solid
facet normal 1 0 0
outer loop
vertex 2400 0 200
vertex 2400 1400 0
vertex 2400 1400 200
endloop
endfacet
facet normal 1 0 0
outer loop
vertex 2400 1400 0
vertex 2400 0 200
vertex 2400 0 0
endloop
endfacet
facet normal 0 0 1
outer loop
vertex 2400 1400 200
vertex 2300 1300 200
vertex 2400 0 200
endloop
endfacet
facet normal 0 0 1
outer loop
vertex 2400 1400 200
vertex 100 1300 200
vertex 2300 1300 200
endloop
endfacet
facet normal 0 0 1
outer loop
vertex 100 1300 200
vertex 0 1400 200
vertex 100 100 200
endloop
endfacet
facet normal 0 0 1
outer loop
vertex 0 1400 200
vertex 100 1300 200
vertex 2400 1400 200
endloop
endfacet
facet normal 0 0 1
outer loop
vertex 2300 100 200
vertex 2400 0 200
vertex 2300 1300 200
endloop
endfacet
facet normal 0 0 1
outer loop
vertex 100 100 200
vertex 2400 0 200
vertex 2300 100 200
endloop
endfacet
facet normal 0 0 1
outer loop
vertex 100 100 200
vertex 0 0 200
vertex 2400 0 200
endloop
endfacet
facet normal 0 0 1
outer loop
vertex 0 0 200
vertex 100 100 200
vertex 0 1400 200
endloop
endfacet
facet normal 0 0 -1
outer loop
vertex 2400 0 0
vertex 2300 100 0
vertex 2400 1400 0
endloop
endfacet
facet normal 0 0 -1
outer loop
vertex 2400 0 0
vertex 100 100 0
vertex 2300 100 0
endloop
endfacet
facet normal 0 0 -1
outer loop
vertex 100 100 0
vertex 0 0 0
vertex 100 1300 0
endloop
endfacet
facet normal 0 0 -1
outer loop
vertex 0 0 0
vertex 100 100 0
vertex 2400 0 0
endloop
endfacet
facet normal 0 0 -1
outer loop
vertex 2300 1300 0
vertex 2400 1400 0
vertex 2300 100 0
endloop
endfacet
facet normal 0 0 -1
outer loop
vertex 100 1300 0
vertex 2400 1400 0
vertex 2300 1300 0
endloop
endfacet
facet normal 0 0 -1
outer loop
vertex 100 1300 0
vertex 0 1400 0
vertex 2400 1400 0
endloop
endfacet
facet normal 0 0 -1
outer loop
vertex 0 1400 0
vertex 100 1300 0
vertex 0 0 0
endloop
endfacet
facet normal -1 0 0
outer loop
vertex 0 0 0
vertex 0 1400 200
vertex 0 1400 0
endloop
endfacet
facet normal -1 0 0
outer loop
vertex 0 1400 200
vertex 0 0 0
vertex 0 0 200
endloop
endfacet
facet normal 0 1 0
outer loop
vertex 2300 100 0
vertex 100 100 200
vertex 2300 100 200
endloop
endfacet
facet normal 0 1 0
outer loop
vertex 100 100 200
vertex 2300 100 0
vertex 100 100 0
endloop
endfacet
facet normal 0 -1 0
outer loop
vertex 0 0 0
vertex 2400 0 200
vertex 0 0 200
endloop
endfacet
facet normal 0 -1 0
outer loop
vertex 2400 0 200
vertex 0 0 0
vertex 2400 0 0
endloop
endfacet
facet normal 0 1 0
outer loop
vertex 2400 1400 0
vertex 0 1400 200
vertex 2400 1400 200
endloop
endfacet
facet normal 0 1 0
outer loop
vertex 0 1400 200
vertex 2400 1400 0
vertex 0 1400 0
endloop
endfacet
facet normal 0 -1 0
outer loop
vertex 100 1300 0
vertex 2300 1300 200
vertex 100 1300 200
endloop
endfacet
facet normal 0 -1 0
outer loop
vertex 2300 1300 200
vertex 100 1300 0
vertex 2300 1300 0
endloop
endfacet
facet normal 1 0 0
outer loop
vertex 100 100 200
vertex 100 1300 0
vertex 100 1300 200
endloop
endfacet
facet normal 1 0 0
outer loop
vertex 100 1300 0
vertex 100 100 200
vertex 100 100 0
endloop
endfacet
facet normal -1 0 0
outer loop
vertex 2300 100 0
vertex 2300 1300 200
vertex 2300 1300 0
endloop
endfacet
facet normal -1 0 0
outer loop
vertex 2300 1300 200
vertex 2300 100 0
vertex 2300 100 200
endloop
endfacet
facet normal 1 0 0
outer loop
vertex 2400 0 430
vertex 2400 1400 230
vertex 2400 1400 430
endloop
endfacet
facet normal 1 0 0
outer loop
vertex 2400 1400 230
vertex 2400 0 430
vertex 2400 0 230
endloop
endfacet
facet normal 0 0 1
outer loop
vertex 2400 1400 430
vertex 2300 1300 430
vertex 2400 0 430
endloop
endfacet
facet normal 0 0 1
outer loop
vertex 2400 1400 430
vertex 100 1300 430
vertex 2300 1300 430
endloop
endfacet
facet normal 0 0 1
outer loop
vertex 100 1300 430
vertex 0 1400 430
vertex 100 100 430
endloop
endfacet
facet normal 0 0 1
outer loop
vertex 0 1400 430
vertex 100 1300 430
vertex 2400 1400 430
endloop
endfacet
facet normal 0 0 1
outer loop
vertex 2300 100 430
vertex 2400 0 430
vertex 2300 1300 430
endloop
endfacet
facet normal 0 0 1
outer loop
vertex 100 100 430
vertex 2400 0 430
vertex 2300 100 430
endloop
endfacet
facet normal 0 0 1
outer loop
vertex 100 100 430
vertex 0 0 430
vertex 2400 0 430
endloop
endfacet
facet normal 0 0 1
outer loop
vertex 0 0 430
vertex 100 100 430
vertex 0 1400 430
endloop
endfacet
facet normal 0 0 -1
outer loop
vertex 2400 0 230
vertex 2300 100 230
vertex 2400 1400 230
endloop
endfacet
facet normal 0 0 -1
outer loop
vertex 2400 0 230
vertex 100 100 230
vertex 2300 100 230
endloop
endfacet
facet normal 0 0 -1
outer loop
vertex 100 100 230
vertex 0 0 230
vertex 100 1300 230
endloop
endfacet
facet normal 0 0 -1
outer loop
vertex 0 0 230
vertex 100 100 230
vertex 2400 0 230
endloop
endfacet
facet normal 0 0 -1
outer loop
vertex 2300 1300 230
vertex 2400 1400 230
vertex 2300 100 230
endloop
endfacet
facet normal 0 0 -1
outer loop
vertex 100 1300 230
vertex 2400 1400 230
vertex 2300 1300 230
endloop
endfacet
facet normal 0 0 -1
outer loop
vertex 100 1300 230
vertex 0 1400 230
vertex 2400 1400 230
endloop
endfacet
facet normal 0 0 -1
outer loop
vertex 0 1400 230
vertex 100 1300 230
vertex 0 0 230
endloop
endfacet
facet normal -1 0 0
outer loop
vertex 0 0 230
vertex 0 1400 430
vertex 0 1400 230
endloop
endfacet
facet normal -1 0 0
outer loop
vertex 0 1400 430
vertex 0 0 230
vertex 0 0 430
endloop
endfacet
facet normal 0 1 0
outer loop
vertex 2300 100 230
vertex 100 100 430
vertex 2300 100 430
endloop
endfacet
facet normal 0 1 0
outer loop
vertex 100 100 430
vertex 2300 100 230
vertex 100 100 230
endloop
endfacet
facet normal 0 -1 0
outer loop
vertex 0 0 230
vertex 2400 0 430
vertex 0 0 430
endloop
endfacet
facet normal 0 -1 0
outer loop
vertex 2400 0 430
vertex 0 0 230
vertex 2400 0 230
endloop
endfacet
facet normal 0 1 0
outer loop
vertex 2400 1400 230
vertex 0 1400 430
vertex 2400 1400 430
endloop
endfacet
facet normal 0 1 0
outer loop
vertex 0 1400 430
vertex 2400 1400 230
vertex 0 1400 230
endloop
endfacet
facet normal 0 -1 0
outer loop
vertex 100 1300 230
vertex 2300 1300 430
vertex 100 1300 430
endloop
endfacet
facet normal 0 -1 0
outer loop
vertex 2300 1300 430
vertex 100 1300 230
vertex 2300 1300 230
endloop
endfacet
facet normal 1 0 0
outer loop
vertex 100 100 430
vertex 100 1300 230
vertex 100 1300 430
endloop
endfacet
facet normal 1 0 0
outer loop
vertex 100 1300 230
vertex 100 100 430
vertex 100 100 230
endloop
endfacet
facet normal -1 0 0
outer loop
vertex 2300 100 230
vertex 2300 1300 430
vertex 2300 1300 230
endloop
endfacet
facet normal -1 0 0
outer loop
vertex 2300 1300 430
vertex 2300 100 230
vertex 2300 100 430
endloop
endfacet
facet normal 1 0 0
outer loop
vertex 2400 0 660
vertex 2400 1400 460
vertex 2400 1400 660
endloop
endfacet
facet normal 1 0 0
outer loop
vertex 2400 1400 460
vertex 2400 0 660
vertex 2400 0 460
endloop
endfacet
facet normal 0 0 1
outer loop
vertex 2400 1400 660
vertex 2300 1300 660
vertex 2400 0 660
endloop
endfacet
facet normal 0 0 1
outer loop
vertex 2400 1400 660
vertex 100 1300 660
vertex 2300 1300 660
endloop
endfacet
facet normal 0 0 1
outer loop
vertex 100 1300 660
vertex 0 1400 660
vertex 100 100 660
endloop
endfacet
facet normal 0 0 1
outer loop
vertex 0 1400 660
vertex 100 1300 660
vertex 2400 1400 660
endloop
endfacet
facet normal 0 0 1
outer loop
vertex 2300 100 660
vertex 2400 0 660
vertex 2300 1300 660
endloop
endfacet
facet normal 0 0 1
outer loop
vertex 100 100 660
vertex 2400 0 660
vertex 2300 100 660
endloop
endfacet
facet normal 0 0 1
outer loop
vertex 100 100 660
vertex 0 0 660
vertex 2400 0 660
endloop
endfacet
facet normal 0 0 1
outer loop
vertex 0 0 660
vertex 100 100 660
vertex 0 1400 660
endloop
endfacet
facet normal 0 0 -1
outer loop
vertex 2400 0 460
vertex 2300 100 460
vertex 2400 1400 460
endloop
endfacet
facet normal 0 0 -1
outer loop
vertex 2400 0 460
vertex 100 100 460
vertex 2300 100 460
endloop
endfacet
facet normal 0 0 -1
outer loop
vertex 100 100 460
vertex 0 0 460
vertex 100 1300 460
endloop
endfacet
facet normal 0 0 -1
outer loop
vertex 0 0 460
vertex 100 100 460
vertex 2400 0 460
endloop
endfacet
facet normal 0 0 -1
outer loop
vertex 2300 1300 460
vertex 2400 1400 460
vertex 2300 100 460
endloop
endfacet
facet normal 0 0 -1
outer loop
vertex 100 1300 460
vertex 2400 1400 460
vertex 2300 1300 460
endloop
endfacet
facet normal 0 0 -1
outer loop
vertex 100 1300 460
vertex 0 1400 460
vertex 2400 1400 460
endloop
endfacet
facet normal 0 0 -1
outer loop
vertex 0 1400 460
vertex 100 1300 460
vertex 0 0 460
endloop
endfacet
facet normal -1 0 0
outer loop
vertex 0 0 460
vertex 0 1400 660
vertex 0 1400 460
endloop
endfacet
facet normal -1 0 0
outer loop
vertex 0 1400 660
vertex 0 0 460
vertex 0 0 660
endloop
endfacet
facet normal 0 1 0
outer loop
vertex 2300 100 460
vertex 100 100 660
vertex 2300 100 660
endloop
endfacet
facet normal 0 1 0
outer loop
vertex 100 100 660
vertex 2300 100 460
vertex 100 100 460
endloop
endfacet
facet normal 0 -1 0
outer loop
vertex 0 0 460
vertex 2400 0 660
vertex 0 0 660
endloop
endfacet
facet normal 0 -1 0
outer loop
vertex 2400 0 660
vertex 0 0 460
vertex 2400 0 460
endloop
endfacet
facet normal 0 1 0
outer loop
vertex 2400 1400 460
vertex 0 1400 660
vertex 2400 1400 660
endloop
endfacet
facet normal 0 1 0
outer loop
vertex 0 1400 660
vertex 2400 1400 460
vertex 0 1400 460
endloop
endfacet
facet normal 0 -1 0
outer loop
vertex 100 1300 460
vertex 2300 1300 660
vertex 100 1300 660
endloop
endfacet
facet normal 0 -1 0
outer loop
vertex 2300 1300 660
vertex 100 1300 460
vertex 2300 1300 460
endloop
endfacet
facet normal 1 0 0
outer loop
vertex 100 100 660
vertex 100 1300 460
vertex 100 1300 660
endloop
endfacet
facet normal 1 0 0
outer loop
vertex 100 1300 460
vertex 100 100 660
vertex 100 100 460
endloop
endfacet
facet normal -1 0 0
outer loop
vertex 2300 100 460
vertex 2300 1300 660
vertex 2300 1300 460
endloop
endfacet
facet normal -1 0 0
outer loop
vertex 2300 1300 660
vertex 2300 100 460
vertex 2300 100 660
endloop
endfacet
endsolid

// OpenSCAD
// Generated from plan.json; millimetres. Not a structural design.
// Open in OpenSCAD. Increase explode_mm to inspect courses.
explode_mm = 30;
$fn = 24;
show_fixing_paths = false;

// first-bed-01-C1-S
translate([0, 0, 0+0*explode_mm])
  color([0.70,0.52,0.33]) cube([2400, 100, 200]);
// first-bed-01-C1-N
translate([0, 1300, 0+0*explode_mm])
  color([0.70,0.52,0.33]) cube([2400, 100, 200]);
// first-bed-01-C1-W
translate([0, 100, 0+0*explode_mm])
  color([0.70,0.52,0.33]) cube([100, 1200, 200]);
// first-bed-01-C1-E
translate([2300, 100, 0+0*explode_mm])
  color([0.70,0.52,0.33]) cube([100, 1200, 200]);
// first-bed-01-C2-S
translate([0, 0, 200+1*explode_mm])
  color([0.70,0.52,0.33]) cube([2400, 100, 200]);
// first-bed-01-C2-N
translate([0, 1300, 200+1*explode_mm])
  color([0.70,0.52,0.33]) cube([2400, 100, 200]);
// first-bed-01-C2-W
translate([0, 100, 200+1*explode_mm])
  color([0.70,0.52,0.33]) cube([100, 1200, 200]);
// first-bed-01-C2-E
translate([2300, 100, 200+1*explode_mm])
  color([0.70,0.52,0.33]) cube([100, 1200, 200]);
// first-bed-01-C3-S
translate([0, 0, 400+2*explode_mm])
  color([0.70,0.52,0.33]) cube([2400, 100, 200]);
// first-bed-01-C3-N
translate([0, 1300, 400+2*explode_mm])
  color([0.70,0.52,0.33]) cube([2400, 100, 200]);
// first-bed-01-C3-W
translate([0, 100, 400+2*explode_mm])
  color([0.70,0.52,0.33]) cube([100, 1200, 200]);
// first-bed-01-C3-E
translate([2300, 100, 400+2*explode_mm])
  color([0.70,0.52,0.33]) cube([100, 1200, 200]);
if (show_fixing_paths) translate([50.0, 1400, 50.0+0*explode_mm]) rotate([90,0,0]) color([0.8,0.1,0.1]) cylinder(d=7, h=150);
if (show_fixing_paths) translate([50.0, 1400, 150.0+0*explode_mm]) rotate([90,0,0]) color([0.8,0.1,0.1]) cylinder(d=7, h=150);
if (show_fixing_paths) translate([2350.0, 1400, 50.0+0*explode_mm]) rotate([90,0,0]) color([0.8,0.1,0.1]) cylinder(d=7, h=150);
if (show_fixing_paths) translate([2350.0, 1400, 150.0+0*explode_mm]) rotate([90,0,0]) color([0.8,0.1,0.1]) cylinder(d=7, h=150);
if (show_fixing_paths) translate([50.0, 0, 50.0+0*explode_mm]) rotate([-90,0,0]) color([0.8,0.1,0.1]) cylinder(d=7, h=150);
if (show_fixing_paths) translate([50.0, 0, 150.0+0*explode_mm]) rotate([-90,0,0]) color([0.8,0.1,0.1]) cylinder(d=7, h=150);
if (show_fixing_paths) translate([2350.0, 0, 50.0+0*explode_mm]) rotate([-90,0,0]) color([0.8,0.1,0.1]) cylinder(d=7, h=150);
if (show_fixing_paths) translate([2350.0, 0, 150.0+0*explode_mm]) rotate([-90,0,0]) color([0.8,0.1,0.1]) cylinder(d=7, h=150);
if (show_fixing_paths) translate([2350.0, 300.0, 400+1*explode_mm]) rotate([180,0,0]) color([0.8,0.1,0.1]) cylinder(d=7, h=250);
if (show_fixing_paths) translate([2350.0, 700.0, 400+1*explode_mm]) rotate([180,0,0]) color([0.8,0.1,0.1]) cylinder(d=7, h=250);
if (show_fixing_paths) translate([2350.0, 1100.0, 400+1*explode_mm]) rotate([180,0,0]) color([0.8,0.1,0.1]) cylinder(d=7, h=250);
if (show_fixing_paths) translate([50.0, 1400, 250.0+1*explode_mm]) rotate([90,0,0]) color([0.8,0.1,0.1]) cylinder(d=7, h=150);
if (show_fixing_paths) translate([50.0, 1400, 350.0+1*explode_mm]) rotate([90,0,0]) color([0.8,0.1,0.1]) cylinder(d=7, h=150);
if (show_fixing_paths) translate([2350.0, 1400, 250.0+1*explode_mm]) rotate([90,0,0]) color([0.8,0.1,0.1]) cylinder(d=7, h=150);
if (show_fixing_paths) translate([2350.0, 1400, 350.0+1*explode_mm]) rotate([90,0,0]) color([0.8,0.1,0.1]) cylinder(d=7, h=150);
if (show_fixing_paths) translate([200.0, 1350.0, 400+1*explode_mm]) rotate([180,0,0]) color([0.8,0.1,0.1]) cylinder(d=7, h=250);
if (show_fixing_paths) translate([700.0, 1350.0, 400+1*explode_mm]) rotate([180,0,0]) color([0.8,0.1,0.1]) cylinder(d=7, h=250);
if (show_fixing_paths) translate([1200.0, 1350.0, 400+1*explode_mm]) rotate([180,0,0]) color([0.8,0.1,0.1]) cylinder(d=7, h=250);
if (show_fixing_paths) translate([1700.0, 1350.0, 400+1*explode_mm]) rotate([180,0,0]) color([0.8,0.1,0.1]) cylinder(d=7, h=250);
if (show_fixing_paths) translate([2200.0, 1350.0, 400+1*explode_mm]) rotate([180,0,0]) color([0.8,0.1,0.1]) cylinder(d=7, h=250);
if (show_fixing_paths) translate([50.0, 0, 250.0+1*explode_mm]) rotate([-90,0,0]) color([0.8,0.1,0.1]) cylinder(d=7, h=150);
if (show_fixing_paths) translate([50.0, 0, 350.0+1*explode_mm]) rotate([-90,0,0]) color([0.8,0.1,0.1]) cylinder(d=7, h=150);
if (show_fixing_paths) translate([2350.0, 0, 250.0+1*explode_mm]) rotate([-90,0,0]) color([0.8,0.1,0.1]) cylinder(d=7, h=150);
if (show_fixing_paths) translate([2350.0, 0, 350.0+1*explode_mm]) rotate([-90,0,0]) color([0.8,0.1,0.1]) cylinder(d=7, h=150);
if (show_fixing_paths) translate([200.0, 50.0, 400+1*explode_mm]) rotate([180,0,0]) color([0.8,0.1,0.1]) cylinder(d=7, h=250);
if (show_fixing_paths) translate([700.0, 50.0, 400+1*explode_mm]) rotate([180,0,0]) color([0.8,0.1,0.1]) cylinder(d=7, h=250);
if (show_fixing_paths) translate([1200.0, 50.0, 400+1*explode_mm]) rotate([180,0,0]) color([0.8,0.1,0.1]) cylinder(d=7, h=250);
if (show_fixing_paths) translate([1700.0, 50.0, 400+1*explode_mm]) rotate([180,0,0]) color([0.8,0.1,0.1]) cylinder(d=7, h=250);
if (show_fixing_paths) translate([2200.0, 50.0, 400+1*explode_mm]) rotate([180,0,0]) color([0.8,0.1,0.1]) cylinder(d=7, h=250);
if (show_fixing_paths) translate([50.0, 300.0, 400+1*explode_mm]) rotate([180,0,0]) color([0.8,0.1,0.1]) cylinder(d=7, h=250);
if (show_fixing_paths) translate([50.0, 700.0, 400+1*explode_mm]) rotate([180,0,0]) color([0.8,0.1,0.1]) cylinder(d=7, h=250);
if (show_fixing_paths) translate([50.0, 1100.0, 400+1*explode_mm]) rotate([180,0,0]) color([0.8,0.1,0.1]) cylinder(d=7, h=250);
if (show_fixing_paths) translate([2350.0, 340.0, 600+2*explode_mm]) rotate([180,0,0]) color([0.8,0.1,0.1]) cylinder(d=7, h=250);
if (show_fixing_paths) translate([2350.0, 740.0, 600+2*explode_mm]) rotate([180,0,0]) color([0.8,0.1,0.1]) cylinder(d=7, h=250);
if (show_fixing_paths) translate([2350.0, 1140.0, 600+2*explode_mm]) rotate([180,0,0]) color([0.8,0.1,0.1]) cylinder(d=7, h=250);
if (show_fixing_paths) translate([50.0, 1400, 450.0+2*explode_mm]) rotate([90,0,0]) color([0.8,0.1,0.1]) cylinder(d=7, h=150);
if (show_fixing_paths) translate([50.0, 1400, 550.0+2*explode_mm]) rotate([90,0,0]) color([0.8,0.1,0.1]) cylinder(d=7, h=150);
if (show_fixing_paths) translate([2350.0, 1400, 450.0+2*explode_mm]) rotate([90,0,0]) color([0.8,0.1,0.1]) cylinder(d=7, h=150);
if (show_fixing_paths) translate([2350.0, 1400, 550.0+2*explode_mm]) rotate([90,0,0]) color([0.8,0.1,0.1]) cylinder(d=7, h=150);
if (show_fixing_paths) translate([240.0, 1350.0, 600+2*explode_mm]) rotate([180,0,0]) color([0.8,0.1,0.1]) cylinder(d=7, h=250);
if (show_fixing_paths) translate([740.0, 1350.0, 600+2*explode_mm]) rotate([180,0,0]) color([0.8,0.1,0.1]) cylinder(d=7, h=250);
if (show_fixing_paths) translate([1240.0, 1350.0, 600+2*explode_mm]) rotate([180,0,0]) color([0.8,0.1,0.1]) cylinder(d=7, h=250);
if (show_fixing_paths) translate([1740.0, 1350.0, 600+2*explode_mm]) rotate([180,0,0]) color([0.8,0.1,0.1]) cylinder(d=7, h=250);
if (show_fixing_paths) translate([2240.0, 1350.0, 600+2*explode_mm]) rotate([180,0,0]) color([0.8,0.1,0.1]) cylinder(d=7, h=250);
if (show_fixing_paths) translate([50.0, 0, 450.0+2*explode_mm]) rotate([-90,0,0]) color([0.8,0.1,0.1]) cylinder(d=7, h=150);
if (show_fixing_paths) translate([50.0, 0, 550.0+2*explode_mm]) rotate([-90,0,0]) color([0.8,0.1,0.1]) cylinder(d=7, h=150);
if (show_fixing_paths) translate([2350.0, 0, 450.0+2*explode_mm]) rotate([-90,0,0]) color([0.8,0.1,0.1]) cylinder(d=7, h=150);
if (show_fixing_paths) translate([2350.0, 0, 550.0+2*explode_mm]) rotate([-90,0,0]) color([0.8,0.1,0.1]) cylinder(d=7, h=150);
if (show_fixing_paths) translate([240.0, 50.0, 600+2*explode_mm]) rotate([180,0,0]) color([0.8,0.1,0.1]) cylinder(d=7, h=250);
if (show_fixing_paths) translate([740.0, 50.0, 600+2*explode_mm]) rotate([180,0,0]) color([0.8,0.1,0.1]) cylinder(d=7, h=250);
if (show_fixing_paths) translate([1240.0, 50.0, 600+2*explode_mm]) rotate([180,0,0]) color([0.8,0.1,0.1]) cylinder(d=7, h=250);
if (show_fixing_paths) translate([1740.0, 50.0, 600+2*explode_mm]) rotate([180,0,0]) color([0.8,0.1,0.1]) cylinder(d=7, h=250);
if (show_fixing_paths) translate([2240.0, 50.0, 600+2*explode_mm]) rotate([180,0,0]) color([0.8,0.1,0.1]) cylinder(d=7, h=250);
if (show_fixing_paths) translate([50.0, 340.0, 600+2*explode_mm]) rotate([180,0,0]) color([0.8,0.1,0.1]) cylinder(d=7, h=250);
if (show_fixing_paths) translate([50.0, 740.0, 600+2*explode_mm]) rotate([180,0,0]) color([0.8,0.1,0.1]) cylinder(d=7, h=250);
if (show_fixing_paths) translate([50.0, 1140.0, 600+2*explode_mm]) rotate([180,0,0]) color([0.8,0.1,0.1]) cylinder(d=7, h=250);
